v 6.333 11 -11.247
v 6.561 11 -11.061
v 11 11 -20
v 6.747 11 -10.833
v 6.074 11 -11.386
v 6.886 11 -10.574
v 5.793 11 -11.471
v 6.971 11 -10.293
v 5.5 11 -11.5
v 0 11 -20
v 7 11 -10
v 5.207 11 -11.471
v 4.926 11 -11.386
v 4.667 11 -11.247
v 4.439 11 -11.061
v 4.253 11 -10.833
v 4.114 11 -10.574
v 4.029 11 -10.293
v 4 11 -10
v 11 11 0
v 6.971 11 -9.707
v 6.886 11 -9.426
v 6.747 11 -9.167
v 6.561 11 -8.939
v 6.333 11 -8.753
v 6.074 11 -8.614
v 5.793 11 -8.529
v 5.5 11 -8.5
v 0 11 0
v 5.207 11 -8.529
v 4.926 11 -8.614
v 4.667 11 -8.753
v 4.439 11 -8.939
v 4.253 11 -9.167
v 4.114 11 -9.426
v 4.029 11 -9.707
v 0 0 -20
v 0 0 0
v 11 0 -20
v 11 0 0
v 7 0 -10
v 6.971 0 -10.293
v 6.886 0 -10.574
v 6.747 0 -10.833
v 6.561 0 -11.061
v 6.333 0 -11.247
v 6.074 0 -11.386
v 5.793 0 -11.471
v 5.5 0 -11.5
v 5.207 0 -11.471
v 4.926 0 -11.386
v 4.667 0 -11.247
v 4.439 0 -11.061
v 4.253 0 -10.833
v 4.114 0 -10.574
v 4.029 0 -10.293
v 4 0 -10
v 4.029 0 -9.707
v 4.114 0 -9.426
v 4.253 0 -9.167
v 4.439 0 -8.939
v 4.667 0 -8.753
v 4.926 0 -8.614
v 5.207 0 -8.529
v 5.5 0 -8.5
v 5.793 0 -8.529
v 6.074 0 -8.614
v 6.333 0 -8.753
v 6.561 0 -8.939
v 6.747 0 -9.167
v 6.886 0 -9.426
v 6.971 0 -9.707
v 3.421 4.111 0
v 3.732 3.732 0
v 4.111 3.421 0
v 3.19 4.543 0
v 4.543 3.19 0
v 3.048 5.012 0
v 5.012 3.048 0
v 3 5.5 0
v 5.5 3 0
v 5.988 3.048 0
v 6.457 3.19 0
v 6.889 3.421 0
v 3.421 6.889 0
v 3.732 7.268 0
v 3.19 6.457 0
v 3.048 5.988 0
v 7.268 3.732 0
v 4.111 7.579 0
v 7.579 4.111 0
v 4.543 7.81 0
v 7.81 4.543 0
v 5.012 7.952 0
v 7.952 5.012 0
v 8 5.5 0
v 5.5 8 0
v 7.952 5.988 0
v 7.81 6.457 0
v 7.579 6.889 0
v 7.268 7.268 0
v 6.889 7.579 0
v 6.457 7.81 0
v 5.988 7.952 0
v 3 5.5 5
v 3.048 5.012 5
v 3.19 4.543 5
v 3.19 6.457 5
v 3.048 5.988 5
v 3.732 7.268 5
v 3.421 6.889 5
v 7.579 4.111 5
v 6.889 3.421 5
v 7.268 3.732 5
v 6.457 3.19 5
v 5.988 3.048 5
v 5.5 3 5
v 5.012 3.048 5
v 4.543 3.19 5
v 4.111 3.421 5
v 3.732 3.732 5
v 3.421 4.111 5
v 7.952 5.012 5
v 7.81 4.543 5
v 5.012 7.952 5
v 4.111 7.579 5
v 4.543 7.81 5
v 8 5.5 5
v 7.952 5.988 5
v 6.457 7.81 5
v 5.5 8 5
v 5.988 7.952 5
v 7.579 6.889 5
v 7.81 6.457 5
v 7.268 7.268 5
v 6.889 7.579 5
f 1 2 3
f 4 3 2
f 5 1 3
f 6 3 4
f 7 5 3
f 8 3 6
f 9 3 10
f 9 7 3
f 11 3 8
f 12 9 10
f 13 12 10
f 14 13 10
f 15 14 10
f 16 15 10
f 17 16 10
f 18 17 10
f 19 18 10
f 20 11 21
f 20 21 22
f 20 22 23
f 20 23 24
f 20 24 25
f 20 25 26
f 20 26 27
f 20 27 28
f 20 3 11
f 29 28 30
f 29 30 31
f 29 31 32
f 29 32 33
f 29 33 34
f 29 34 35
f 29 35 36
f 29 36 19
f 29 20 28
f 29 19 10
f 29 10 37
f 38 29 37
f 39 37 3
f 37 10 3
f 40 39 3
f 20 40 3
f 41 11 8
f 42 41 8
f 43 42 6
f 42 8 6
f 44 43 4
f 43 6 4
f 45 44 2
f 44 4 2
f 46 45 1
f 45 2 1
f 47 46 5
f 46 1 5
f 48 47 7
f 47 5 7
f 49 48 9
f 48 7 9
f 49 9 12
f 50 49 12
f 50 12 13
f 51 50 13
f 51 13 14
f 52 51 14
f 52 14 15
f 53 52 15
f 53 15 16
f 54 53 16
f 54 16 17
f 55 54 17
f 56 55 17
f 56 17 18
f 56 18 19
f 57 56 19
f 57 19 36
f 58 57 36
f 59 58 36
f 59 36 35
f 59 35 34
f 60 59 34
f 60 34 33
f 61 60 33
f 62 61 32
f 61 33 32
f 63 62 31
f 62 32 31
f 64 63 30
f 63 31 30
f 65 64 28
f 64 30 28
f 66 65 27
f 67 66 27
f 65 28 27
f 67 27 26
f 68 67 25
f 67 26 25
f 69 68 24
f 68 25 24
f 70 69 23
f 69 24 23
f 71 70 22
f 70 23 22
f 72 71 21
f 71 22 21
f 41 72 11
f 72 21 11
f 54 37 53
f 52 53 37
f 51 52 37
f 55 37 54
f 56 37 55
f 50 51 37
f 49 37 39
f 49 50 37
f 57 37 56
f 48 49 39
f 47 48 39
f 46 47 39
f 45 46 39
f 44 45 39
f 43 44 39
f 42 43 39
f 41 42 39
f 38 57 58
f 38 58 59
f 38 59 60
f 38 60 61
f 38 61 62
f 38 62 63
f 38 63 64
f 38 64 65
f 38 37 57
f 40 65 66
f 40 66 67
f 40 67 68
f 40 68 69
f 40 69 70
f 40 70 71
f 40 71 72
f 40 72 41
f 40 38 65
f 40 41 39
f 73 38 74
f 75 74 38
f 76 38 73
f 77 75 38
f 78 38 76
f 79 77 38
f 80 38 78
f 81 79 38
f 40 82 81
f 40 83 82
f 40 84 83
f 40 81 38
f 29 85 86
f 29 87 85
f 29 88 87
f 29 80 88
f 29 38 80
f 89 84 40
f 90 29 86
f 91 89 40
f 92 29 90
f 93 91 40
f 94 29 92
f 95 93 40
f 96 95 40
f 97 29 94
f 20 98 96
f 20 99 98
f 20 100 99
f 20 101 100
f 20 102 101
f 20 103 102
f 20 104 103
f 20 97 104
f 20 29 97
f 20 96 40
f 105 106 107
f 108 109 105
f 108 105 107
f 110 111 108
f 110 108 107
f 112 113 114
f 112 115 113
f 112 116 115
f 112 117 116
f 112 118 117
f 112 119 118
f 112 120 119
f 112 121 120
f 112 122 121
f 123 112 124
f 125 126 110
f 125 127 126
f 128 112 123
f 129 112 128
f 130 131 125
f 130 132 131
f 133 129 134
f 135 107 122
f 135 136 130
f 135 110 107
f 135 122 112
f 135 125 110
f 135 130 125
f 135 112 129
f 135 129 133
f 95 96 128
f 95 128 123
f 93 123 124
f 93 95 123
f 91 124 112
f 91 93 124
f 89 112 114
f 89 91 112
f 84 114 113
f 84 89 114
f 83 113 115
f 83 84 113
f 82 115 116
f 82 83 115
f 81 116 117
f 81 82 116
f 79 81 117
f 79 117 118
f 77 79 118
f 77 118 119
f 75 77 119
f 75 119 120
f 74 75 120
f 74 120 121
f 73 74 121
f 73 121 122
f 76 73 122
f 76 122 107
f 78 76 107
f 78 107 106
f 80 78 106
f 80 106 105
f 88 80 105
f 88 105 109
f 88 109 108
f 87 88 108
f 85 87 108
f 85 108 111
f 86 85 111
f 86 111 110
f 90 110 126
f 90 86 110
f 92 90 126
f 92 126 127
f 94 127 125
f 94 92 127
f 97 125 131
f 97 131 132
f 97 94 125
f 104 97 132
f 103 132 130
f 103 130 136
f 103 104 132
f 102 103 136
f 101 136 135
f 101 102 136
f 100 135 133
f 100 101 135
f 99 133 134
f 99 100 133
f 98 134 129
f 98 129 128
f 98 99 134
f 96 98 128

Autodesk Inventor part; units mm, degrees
ref_plane "YZ Plane" through (0, 0, 0) normal (1, 0, 0) x (0, 1, 0)
ref_plane "XZ Plane" through (0, 0, 0) normal (0, 1, 0) x (-1, 0, 0)
ref_plane "XY Plane" through (0, 0, 0) normal (0, 0, 1) x (1, 0, 0)
sketch "Sketch1" plane through (0, 0, 0) normal (0, 0, 1) x (1, 0, 0)
  line L0 (0, 0) -> (11, 0)
  line L1 (11, 0) -> (11, 11)
  line L2 (11, 11) -> (0, 11)
  line L3 (0, 11) -> (0, 0)
  dimension "d0" = 11
  dimension "d1" = 11
extrude "Extrusion1" add sketch "Sketch1" against normal blind 20
sketch "Sketch2" plane through (0, 0, 0) normal (0, 0, 1) x (1, 0, 0)
  line L0 (0, 0) -> (0, 11) projected
  line L1 (11, 11) -> (11, 0) projected
  line L2 (0, 11) -> (11, 0)
  line L3 (11, 0) -> (11, 11)
  line L4 (11, 11) -> (0, 0)
  circle A0 centre (5.5, 5.5) radius 2.5
  dimension "d4" = 5
extrude "Extrusion2" add sketch "Sketch2" along normal blind 5 contours A0 L2 L4 | L4 L2 A0 | A0 L4 L2 | L4 A0 L2
sketch "Sketch3" plane through (0, 11, 0) normal (0, 1, 0) x (1, 0, 0)
  line L0 (0, 0) -> (0, 20) projected
  line L1 (0, 10) -> (11, 10)
  line L2 (11, 0) -> (11, 20) projected
  line L3 (0, 0) -> (11, 0) projected
  line L4 (5.5, 0) -> (5.5, 20)
  circle A0 centre (5.5, 10) radius 1.5
  dimension "d7" = 3
extrude "Extrusion3" cut sketch "Sketch3" against normal through all contours A0 L4 L1 | L1 L4 A0 | L4 L1 A0 | L4 A0 L1
properties part number "Aluminium-Connector_Lengan pendek"
